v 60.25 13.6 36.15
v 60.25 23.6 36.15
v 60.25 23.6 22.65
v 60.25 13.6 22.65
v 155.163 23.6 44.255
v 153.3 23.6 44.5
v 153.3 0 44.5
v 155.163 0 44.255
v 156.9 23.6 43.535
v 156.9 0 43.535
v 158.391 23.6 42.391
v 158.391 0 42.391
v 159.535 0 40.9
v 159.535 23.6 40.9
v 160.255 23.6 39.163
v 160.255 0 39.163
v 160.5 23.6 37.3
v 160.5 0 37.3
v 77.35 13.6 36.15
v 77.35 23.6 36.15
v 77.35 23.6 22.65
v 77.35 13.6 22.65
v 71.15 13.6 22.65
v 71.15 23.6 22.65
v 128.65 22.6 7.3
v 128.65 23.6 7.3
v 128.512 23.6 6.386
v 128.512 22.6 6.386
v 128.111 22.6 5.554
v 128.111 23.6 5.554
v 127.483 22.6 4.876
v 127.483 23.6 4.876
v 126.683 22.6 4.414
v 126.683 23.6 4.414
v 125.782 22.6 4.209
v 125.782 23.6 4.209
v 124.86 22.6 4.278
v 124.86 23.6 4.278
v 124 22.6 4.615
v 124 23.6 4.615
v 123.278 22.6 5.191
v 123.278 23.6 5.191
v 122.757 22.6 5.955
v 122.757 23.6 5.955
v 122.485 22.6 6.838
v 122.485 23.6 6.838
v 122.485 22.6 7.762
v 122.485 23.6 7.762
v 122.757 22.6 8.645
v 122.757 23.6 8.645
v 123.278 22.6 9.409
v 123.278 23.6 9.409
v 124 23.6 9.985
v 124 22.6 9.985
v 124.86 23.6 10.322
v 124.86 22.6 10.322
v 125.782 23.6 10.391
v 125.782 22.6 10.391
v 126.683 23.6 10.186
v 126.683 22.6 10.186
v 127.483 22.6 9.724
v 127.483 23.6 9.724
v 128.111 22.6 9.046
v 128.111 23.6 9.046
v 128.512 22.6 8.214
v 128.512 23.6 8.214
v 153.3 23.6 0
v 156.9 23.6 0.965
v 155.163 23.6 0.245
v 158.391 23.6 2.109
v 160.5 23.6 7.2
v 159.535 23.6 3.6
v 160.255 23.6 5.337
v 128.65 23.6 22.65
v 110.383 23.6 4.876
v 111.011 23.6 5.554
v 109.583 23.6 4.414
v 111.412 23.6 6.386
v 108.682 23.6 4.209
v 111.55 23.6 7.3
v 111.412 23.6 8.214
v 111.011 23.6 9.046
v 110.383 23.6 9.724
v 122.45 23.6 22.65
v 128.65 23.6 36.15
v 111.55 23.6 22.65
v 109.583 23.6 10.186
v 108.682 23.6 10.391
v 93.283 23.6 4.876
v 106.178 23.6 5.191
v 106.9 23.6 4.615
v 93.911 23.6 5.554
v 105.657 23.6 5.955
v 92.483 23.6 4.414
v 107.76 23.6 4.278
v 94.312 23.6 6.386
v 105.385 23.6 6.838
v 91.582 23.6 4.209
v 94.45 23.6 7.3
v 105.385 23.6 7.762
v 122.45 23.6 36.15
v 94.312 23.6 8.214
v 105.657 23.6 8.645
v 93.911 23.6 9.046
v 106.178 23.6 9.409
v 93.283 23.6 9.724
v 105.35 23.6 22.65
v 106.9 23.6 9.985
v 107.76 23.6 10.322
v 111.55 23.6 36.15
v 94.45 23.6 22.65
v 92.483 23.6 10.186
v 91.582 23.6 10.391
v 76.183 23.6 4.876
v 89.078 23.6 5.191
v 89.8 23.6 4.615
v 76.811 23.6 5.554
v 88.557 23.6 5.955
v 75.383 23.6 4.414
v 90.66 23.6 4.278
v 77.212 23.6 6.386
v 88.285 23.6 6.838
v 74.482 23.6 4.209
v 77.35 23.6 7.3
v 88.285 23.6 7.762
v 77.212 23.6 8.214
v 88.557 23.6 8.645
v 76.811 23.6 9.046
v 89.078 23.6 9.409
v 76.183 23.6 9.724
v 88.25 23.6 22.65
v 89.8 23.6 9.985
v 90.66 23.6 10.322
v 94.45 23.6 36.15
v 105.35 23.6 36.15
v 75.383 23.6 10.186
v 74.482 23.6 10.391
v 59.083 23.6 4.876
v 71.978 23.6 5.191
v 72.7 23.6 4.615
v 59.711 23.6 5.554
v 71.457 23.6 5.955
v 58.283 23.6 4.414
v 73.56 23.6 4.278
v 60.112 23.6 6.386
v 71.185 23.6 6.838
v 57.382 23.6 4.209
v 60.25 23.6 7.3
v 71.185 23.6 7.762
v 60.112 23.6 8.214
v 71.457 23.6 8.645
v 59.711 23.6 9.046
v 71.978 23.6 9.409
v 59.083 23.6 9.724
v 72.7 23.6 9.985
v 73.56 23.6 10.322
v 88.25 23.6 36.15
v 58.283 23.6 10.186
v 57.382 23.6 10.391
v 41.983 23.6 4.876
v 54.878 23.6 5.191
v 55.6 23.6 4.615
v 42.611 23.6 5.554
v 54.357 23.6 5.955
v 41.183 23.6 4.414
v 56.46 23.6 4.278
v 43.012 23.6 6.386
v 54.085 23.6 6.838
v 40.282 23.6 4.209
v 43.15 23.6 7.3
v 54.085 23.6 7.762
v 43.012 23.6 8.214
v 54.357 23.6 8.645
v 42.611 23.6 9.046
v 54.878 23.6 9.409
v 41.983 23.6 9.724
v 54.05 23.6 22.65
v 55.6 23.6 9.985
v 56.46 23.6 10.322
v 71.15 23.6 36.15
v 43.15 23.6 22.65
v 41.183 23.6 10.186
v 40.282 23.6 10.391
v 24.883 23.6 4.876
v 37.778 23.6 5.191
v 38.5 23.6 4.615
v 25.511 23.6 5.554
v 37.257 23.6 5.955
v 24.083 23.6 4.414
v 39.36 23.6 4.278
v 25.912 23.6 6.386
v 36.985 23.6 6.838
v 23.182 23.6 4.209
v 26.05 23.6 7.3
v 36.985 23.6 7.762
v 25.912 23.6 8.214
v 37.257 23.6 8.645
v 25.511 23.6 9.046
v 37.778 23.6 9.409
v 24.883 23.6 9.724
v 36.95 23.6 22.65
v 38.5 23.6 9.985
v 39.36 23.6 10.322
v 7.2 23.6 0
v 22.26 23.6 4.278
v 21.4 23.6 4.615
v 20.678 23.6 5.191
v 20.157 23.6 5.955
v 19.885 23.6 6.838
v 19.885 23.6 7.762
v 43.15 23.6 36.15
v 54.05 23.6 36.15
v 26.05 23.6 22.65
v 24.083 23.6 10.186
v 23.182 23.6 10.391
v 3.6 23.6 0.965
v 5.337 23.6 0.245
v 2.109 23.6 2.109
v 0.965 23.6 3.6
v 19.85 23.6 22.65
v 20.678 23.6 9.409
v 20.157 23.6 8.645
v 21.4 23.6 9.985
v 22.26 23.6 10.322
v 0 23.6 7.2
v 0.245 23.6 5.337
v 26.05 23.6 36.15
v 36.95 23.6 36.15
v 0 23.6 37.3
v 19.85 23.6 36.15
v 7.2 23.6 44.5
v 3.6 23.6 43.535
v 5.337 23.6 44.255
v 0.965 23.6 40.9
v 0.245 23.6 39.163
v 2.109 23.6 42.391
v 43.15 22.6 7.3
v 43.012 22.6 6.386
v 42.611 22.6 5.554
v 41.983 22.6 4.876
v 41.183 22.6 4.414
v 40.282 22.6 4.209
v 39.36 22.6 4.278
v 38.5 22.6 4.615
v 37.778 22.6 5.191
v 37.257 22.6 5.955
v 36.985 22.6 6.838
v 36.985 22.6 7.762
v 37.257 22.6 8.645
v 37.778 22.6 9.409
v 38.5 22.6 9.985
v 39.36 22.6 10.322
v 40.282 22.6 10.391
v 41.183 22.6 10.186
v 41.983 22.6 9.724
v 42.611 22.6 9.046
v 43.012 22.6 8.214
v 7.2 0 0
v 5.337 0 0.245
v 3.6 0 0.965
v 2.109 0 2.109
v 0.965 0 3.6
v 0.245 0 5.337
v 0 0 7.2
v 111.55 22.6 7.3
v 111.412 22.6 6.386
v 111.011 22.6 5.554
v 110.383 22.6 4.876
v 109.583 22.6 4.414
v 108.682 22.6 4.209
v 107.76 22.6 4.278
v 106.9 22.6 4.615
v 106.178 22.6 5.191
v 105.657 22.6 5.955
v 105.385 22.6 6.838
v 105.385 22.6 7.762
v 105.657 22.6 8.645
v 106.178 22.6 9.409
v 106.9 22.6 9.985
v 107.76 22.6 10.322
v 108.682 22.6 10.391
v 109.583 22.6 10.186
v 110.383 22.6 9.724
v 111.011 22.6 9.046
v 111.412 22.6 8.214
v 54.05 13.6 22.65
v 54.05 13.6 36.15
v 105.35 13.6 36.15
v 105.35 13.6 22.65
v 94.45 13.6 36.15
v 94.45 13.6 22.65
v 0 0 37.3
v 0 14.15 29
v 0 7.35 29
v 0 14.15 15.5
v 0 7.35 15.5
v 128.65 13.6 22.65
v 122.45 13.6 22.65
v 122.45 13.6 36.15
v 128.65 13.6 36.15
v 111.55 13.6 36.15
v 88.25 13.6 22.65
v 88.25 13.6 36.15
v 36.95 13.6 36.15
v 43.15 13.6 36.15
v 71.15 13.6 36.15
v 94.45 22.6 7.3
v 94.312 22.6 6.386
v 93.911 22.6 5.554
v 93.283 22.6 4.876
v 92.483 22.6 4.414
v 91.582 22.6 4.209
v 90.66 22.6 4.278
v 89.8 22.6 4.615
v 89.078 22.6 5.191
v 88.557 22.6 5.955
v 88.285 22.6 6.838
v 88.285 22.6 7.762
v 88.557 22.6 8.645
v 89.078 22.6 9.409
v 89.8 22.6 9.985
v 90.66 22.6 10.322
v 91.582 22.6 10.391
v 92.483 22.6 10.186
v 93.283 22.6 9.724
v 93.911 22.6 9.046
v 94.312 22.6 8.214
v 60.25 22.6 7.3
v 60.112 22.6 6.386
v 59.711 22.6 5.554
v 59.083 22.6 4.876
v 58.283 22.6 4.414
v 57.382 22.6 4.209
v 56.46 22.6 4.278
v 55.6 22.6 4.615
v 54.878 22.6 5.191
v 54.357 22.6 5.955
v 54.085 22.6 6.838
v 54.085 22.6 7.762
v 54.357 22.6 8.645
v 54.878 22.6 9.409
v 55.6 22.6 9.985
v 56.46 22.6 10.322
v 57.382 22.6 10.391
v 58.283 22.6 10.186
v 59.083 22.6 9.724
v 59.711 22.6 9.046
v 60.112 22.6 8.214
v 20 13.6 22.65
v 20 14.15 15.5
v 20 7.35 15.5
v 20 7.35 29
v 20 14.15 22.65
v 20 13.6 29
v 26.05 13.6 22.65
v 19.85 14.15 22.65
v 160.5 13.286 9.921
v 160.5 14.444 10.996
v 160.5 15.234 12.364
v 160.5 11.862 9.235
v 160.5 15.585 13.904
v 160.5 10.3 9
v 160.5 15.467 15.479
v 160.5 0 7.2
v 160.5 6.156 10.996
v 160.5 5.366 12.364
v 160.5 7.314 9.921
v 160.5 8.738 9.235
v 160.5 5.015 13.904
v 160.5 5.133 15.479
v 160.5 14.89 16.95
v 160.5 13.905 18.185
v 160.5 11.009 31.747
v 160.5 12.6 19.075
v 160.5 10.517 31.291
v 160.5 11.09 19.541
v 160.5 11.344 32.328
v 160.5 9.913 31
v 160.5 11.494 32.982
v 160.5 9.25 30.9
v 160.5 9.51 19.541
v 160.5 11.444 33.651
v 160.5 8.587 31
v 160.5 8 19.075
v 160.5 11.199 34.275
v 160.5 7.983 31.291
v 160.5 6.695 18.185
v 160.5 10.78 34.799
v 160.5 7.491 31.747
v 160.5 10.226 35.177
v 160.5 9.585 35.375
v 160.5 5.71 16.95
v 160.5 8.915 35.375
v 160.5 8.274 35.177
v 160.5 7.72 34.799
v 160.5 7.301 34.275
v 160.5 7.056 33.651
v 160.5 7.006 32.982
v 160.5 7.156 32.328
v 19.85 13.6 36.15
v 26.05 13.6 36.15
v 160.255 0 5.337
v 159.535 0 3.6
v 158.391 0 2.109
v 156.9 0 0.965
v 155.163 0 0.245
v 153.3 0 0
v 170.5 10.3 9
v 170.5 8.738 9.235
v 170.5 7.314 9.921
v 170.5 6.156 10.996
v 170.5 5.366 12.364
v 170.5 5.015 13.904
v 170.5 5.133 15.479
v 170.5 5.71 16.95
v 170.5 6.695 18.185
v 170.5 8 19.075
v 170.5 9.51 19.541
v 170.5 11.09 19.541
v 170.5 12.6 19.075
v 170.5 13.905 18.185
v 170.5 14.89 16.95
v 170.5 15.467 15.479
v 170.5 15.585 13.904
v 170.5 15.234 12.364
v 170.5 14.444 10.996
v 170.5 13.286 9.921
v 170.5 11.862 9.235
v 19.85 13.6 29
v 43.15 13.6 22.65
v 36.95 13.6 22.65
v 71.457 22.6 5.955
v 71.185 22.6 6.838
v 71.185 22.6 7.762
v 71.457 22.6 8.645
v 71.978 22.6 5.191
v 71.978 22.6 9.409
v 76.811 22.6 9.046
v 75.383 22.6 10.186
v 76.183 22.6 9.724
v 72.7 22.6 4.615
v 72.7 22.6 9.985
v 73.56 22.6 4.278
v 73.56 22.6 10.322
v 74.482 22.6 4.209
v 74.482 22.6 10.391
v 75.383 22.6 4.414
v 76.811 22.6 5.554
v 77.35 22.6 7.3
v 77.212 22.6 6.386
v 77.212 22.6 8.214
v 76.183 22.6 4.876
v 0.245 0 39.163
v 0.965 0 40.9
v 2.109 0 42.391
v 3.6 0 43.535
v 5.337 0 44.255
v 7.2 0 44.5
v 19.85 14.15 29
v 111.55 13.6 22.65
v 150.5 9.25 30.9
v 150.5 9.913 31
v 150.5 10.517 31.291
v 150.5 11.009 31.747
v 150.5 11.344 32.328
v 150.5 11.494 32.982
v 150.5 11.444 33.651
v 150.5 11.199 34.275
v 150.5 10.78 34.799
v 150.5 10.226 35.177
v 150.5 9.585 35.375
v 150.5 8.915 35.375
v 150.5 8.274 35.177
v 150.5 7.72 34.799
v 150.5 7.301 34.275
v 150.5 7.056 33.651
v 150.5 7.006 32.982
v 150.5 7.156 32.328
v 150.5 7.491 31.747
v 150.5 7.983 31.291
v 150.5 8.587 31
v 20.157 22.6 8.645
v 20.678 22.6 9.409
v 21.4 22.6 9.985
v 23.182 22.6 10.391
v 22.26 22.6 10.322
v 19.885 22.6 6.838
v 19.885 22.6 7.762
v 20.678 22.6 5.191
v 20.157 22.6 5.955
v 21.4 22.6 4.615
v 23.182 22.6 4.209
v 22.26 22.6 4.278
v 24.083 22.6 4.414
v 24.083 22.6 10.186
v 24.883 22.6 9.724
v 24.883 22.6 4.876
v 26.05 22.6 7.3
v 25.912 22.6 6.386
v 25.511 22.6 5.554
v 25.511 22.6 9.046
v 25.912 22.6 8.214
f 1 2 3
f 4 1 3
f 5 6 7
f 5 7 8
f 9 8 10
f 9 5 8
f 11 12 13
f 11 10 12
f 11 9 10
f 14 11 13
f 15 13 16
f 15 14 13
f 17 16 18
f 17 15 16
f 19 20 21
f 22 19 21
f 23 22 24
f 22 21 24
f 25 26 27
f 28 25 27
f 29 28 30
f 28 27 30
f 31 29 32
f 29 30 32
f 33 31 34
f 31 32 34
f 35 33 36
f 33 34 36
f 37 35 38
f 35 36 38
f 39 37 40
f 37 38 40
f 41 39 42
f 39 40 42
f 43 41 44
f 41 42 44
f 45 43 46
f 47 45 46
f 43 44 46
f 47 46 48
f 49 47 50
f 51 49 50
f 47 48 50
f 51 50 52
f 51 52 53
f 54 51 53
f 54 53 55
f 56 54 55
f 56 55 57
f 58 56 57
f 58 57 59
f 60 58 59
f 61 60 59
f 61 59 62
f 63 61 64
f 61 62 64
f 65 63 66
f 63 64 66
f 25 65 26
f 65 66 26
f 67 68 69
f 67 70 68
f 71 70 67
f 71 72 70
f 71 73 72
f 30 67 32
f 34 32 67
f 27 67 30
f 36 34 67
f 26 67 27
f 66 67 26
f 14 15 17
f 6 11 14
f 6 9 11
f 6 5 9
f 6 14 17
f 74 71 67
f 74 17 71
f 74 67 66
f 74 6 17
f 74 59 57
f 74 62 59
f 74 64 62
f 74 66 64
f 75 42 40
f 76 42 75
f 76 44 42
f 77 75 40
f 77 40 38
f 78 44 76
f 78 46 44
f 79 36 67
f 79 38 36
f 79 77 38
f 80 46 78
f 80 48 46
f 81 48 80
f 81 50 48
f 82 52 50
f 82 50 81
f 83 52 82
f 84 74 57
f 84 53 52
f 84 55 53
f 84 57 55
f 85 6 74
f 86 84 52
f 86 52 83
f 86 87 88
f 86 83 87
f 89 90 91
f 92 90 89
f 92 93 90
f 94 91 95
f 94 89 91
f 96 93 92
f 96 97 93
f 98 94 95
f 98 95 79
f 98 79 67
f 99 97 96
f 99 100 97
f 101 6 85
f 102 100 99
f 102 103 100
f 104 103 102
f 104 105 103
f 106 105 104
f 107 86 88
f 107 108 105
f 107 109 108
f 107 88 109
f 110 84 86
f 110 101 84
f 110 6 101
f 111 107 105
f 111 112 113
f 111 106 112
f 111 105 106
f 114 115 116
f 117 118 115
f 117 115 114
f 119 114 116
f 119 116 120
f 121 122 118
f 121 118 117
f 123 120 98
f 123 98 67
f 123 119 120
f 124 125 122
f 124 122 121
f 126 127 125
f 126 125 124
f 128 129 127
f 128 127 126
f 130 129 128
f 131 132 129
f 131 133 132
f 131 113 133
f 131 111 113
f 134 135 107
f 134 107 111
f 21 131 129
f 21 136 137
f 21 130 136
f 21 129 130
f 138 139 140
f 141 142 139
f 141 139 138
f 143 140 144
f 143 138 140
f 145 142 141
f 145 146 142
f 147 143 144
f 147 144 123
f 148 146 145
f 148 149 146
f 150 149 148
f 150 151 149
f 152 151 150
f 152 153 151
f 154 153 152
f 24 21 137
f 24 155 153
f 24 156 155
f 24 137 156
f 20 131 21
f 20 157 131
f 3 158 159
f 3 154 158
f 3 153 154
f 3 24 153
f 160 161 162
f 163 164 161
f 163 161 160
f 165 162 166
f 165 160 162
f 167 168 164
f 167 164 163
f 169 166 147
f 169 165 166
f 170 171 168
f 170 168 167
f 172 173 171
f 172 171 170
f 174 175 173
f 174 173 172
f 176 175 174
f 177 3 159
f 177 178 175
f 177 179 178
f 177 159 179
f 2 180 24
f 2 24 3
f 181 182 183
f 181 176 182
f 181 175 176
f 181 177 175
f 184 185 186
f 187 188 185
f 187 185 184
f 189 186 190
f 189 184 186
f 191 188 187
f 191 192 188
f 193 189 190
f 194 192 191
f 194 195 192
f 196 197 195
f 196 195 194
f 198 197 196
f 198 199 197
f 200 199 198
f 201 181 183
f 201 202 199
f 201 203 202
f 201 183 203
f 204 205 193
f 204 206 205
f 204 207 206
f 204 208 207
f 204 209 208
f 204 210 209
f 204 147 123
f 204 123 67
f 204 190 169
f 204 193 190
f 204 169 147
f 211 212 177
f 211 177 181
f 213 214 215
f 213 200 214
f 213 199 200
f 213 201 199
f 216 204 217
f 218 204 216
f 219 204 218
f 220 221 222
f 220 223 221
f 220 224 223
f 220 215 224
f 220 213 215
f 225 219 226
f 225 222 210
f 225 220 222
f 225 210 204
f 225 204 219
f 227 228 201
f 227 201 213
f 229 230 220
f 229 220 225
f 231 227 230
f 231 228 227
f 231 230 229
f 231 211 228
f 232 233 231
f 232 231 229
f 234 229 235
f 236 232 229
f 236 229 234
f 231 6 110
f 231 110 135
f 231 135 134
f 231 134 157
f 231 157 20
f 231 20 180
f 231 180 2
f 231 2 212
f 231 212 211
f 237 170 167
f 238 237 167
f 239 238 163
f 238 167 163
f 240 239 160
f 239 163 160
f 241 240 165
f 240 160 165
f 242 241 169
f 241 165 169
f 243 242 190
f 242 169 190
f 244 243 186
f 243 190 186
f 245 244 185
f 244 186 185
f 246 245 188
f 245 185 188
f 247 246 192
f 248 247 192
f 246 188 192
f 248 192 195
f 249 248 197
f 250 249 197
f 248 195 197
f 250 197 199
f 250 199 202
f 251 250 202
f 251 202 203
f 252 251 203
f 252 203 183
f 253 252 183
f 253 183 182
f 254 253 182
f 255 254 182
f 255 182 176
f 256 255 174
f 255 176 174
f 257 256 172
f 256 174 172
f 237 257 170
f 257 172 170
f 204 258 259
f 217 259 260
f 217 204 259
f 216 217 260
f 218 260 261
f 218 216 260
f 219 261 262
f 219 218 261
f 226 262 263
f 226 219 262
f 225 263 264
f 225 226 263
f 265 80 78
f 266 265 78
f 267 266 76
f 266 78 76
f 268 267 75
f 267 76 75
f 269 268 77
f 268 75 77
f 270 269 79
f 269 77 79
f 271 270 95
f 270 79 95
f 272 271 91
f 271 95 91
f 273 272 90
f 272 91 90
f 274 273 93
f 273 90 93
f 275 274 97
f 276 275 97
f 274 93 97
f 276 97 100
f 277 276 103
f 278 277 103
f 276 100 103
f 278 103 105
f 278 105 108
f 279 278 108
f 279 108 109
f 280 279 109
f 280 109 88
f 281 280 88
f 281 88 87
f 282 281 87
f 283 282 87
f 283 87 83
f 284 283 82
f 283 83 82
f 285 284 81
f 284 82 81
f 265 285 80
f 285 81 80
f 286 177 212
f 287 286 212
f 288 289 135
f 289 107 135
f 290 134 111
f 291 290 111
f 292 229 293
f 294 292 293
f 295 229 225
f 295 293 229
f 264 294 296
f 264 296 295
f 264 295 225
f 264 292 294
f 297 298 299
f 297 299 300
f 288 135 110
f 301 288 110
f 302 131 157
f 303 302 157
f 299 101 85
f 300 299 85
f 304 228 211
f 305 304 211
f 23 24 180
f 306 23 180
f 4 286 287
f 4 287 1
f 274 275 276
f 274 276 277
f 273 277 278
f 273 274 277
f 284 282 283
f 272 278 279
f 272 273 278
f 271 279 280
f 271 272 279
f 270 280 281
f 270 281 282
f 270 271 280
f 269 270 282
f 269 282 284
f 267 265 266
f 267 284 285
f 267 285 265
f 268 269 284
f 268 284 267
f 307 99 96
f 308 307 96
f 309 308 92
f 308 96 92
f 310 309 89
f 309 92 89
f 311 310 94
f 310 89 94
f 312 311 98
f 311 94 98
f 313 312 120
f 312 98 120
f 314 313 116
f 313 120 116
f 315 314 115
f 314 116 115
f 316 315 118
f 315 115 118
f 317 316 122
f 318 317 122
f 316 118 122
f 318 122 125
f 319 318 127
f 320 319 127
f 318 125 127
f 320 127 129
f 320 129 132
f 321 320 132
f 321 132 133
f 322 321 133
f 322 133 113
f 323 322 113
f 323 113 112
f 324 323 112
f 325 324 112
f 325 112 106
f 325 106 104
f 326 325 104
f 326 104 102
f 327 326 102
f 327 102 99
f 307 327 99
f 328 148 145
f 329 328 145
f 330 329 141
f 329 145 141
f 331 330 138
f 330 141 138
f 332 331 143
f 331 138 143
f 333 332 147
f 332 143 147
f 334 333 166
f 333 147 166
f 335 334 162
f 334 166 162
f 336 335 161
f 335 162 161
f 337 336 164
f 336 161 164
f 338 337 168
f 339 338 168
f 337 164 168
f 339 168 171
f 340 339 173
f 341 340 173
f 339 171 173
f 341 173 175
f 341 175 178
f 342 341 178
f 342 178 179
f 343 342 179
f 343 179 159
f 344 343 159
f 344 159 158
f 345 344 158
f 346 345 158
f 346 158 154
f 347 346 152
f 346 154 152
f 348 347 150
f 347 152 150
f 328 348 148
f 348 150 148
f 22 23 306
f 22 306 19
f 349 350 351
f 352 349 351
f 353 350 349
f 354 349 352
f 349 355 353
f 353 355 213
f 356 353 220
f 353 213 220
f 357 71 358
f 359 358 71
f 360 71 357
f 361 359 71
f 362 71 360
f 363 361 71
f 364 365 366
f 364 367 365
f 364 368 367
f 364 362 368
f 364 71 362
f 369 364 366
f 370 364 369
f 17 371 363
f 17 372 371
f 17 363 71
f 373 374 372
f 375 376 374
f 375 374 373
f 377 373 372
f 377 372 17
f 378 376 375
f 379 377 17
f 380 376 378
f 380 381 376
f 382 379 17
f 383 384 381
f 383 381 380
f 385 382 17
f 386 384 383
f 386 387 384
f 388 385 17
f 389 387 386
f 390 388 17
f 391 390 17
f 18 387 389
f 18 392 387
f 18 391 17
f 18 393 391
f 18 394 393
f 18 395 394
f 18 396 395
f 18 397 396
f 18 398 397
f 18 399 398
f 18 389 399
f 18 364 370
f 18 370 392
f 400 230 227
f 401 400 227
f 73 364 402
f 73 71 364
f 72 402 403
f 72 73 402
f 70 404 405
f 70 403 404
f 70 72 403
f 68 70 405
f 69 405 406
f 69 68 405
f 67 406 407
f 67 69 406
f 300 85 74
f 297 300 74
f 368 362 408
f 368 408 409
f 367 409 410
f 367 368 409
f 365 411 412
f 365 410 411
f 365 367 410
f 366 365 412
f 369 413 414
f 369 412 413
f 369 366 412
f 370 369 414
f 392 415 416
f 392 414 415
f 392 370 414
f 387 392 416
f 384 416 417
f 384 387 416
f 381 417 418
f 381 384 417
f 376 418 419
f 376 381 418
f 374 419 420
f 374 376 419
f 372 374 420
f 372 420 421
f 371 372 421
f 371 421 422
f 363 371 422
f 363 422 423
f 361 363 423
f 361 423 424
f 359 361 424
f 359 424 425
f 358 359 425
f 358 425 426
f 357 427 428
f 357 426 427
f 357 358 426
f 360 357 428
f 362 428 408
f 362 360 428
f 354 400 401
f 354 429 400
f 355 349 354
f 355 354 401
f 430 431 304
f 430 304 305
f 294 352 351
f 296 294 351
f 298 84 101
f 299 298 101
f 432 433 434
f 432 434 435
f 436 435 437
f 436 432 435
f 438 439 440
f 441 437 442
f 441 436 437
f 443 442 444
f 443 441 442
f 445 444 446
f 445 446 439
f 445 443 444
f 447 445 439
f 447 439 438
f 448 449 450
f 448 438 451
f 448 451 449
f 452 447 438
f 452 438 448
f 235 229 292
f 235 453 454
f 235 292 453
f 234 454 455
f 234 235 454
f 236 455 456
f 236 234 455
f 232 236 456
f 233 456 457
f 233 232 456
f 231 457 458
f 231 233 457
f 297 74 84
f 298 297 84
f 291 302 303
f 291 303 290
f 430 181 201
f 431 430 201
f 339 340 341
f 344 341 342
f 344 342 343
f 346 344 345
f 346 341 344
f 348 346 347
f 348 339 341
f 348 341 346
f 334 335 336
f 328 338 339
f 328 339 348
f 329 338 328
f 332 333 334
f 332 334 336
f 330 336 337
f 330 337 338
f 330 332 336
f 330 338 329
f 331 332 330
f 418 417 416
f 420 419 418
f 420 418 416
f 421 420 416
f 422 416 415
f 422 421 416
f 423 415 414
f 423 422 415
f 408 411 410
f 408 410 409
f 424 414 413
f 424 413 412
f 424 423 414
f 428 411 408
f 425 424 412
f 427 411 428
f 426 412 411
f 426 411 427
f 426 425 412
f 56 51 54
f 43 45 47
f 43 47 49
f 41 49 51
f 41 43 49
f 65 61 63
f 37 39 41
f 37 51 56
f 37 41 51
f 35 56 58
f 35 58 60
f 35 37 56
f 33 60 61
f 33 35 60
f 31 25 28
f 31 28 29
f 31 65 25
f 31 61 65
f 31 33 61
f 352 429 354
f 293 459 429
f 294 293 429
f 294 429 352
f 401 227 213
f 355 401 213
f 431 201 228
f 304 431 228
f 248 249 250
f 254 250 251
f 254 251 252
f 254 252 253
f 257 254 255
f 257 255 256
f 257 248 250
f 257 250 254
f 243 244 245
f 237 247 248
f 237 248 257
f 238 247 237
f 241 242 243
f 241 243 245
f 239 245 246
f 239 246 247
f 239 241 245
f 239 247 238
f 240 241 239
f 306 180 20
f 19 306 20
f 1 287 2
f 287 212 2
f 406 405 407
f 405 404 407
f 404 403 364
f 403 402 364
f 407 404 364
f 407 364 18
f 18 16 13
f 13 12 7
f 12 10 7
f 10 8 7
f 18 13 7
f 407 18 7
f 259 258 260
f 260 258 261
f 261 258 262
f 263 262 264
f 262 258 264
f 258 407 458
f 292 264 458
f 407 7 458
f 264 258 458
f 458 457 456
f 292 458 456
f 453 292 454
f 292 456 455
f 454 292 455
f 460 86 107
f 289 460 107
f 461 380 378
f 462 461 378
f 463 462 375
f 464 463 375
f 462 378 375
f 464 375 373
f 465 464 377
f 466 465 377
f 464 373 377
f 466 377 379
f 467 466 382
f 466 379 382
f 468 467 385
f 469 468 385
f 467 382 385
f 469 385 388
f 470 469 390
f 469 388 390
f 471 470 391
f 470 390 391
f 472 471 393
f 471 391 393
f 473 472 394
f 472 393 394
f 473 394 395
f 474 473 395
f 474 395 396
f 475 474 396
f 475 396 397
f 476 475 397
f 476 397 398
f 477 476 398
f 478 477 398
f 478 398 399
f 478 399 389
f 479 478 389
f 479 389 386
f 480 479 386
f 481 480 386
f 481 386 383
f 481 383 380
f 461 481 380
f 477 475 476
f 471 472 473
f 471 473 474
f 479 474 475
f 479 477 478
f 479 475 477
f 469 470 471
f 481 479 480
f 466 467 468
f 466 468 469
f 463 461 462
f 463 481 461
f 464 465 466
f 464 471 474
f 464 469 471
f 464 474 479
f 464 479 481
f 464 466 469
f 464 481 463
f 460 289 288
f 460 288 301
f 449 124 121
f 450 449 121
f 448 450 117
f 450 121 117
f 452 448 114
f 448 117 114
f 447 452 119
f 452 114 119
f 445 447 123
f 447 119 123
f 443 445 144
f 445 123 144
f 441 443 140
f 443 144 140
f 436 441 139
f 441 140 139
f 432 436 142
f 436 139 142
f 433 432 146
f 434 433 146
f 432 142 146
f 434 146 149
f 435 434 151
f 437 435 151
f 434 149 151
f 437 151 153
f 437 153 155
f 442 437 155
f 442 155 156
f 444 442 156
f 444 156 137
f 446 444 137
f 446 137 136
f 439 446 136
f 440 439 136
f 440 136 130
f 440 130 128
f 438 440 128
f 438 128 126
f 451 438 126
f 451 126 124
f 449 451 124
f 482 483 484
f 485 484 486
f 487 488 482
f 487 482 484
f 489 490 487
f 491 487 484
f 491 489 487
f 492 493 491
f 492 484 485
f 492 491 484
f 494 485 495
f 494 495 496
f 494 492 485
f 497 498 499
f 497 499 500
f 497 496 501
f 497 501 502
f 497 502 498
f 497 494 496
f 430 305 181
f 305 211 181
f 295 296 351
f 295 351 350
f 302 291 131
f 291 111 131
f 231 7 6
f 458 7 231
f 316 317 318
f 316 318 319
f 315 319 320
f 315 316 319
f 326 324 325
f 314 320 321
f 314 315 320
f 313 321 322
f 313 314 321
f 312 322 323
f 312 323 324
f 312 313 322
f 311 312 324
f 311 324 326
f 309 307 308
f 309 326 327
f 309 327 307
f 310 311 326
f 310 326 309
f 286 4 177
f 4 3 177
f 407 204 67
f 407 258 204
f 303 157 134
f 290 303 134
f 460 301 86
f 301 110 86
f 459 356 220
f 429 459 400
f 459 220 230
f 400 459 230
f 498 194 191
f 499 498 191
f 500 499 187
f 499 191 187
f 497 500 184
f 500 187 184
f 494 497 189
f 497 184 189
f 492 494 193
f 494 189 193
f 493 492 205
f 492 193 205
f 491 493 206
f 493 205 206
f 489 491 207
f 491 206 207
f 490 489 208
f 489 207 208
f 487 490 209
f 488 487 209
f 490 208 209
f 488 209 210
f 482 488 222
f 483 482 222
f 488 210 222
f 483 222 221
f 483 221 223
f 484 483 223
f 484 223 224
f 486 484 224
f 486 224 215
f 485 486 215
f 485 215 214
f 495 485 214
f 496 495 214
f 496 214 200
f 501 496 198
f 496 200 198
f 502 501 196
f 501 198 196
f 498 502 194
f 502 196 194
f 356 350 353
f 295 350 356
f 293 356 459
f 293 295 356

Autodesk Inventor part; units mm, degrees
ref_plane "YZ Plane" through (0, 0, 0) normal (1, 0, 0) x (0, 1, 0)
ref_plane "XZ Plane" through (0, 0, 0) normal (0, 1, 0) x (-1, 0, 0)
ref_plane "XY Plane" through (0, 0, 0) normal (0, 0, 1) x (1, 0, 0)
sketch "Sketch1" plane through (0, 0, 0) normal (0, 1, 0) x (-1, 0, 0)
  line L0 (0, 0) -> (-160.5, 0)
  line L1 (-160.5, 0) -> (-160.5, 44.5)
  line L2 (-160.5, 44.5) -> (0, 44.5)
  line L3 (0, 44.5) -> (0, 0)
  dimension "d0" = 44.5
  dimension "d1" = 160.5
extrude "Extrusion1" add sketch "Sketch1" along normal blind 23.6
fillet "Fillet1" radius 7.2 4 edges at (0, 11.8, 44.5) (160.5, 11.8, 44.5) (160.5, 11.8, 0) (0, 11.8, 0)
sketch "Sketch2" plane through (160.5, 0, 37.3) normal (1, 0, 0) x (0, 0, -1)
  circle A0 centre (4.15, 9.25) radius 2.25
  line L0 (-7.2, 23.6) -> (-7.2, 0) projected
  line L1 (6.4, 23.6) -> (6.4, 0) construction
  line L2 (0, 23.6) -> (30.1, 23.6) construction
  line L3 (30.1, 0) -> (0, 0) construction
  line L4 (13.7348, 11.5) -> (-5.9943, 11.5) construction
  line L5 (0, 0) -> (-7.2, 0) construction
  point P0 (37.3, 0)
  dimension "d5" = 4.5
  dimension "d7" = 13.6
  dimension "d8" = 11.5
extrude "Extrusion2" cut sketch "Sketch2" against normal blind 10
sketch "Sketch3" plane through (160.5, 0, 37.3) normal (1, 0, 0) x (0, 0, -1)
  circle A0 centre (23, 10.3) radius 5.3
  line L0 (17.7, 15.6) -> (17.7, 1.2331) construction
  line L1 (17.7, 15.6) -> (23.008, 15.6) construction
  line L2 (30.1, 0) -> (0, 0) construction
  line L3 (37.3, 0) -> (37.3, 23.6) construction
  dimension "d11" = 10.6
  dimension "d12" = 15.6
  dimension "d13" = 19.6
extrude "Extrusion3" add sketch "Sketch3" along normal blind 10
sketch "Sketch4" plane through (0, 0, 7.2) normal (-1, 0, 0) x (0, 0, 1)
  line L0 (8.3, 14.15) -> (21.8, 14.15)
  line L1 (21.8, 14.15) -> (21.8, 7.35)
  line L2 (21.8, 7.35) -> (8.3, 7.35)
  line L3 (8.3, 7.35) -> (8.3, 14.15)
  line L4 (30.1, 0) -> (0, 0) projected
  line L5 (-7.2, 23.6) -> (-7.2, 0) projected
  line L6 (37.3, 0) -> (37.3, 23.6) projected
  dimension "d16" = 7.35
  dimension "d17" = 6.8
  dimension "d18" = 13.5
  dimension "d19" = 15.5
  dimension "d20" = 15.5
extrude "Extrusion4" cut sketch "Sketch4" against normal blind 20
sketch "Sketch5" plane through (0, 23.6, 0) normal (0, 1, 0) x (1, 0, 0)
  line L0 (0.85, -43.7) -> (159.65, -43.7) construction
  line L1 (159.65, -43.7) -> (159.65, -0.8) construction
  line L2 (159.65, -0.8) -> (0.85, -0.8) construction
  line L3 (0.85, -0.8) -> (0.85, -43.7) construction
  line L4 (153.3, 0) -> (7.2, 0) construction
  line L5 (7.2, -44.5) -> (153.3, -44.5) construction
  line L6 (0, -7.2) -> (0, -37.3) construction
  line L7 (160.5, -37.3) -> (160.5, -7.2) construction
  line L8 (19.85, -36.15) -> (26.05, -36.15)
  line L9 (26.05, -36.15) -> (26.05, -22.65)
  line L10 (26.05, -22.65) -> (19.85, -22.65)
  line L11 (19.85, -22.65) -> (19.85, -36.15)
  line L12 (43.15, -36.15) -> (43.15, -22.65)
  line L13 (43.15, -22.65) -> (36.95, -22.65)
  line L14 (36.95, -22.65) -> (36.95, -36.15)
  line L15 (36.95, -36.15) -> (43.15, -36.15)
  line L16 (60.25, -36.15) -> (60.25, -22.65)
  line L17 (60.25, -22.65) -> (54.05, -22.65)
  line L18 (54.05, -22.65) -> (54.05, -36.15)
  line L19 (54.05, -36.15) -> (60.25, -36.15)
  line L20 (77.35, -36.15) -> (77.35, -22.65)
  line L21 (77.35, -22.65) -> (71.15, -22.65)
  line L22 (71.15, -22.65) -> (71.15, -36.15)
  line L23 (71.15, -36.15) -> (77.35, -36.15)
  line L24 (94.45, -36.15) -> (94.45, -22.65)
  line L25 (94.45, -22.65) -> (88.25, -22.65)
  line L26 (88.25, -22.65) -> (88.25, -36.15)
  line L27 (88.25, -36.15) -> (94.45, -36.15)
  line L28 (111.55, -36.15) -> (111.55, -22.65)
  line L29 (111.55, -22.65) -> (105.35, -22.65)
  line L30 (105.35, -22.65) -> (105.35, -36.15)
  line L31 (105.35, -36.15) -> (111.55, -36.15)
  line L32 (128.65, -36.15) -> (128.65, -22.65)
  line L33 (128.65, -22.65) -> (122.45, -22.65)
  line L34 (122.45, -22.65) -> (122.45, -36.15)
  line L35 (122.45, -36.15) -> (128.65, -36.15)
  point P0 (0, 0)
  dimension "d23" = 42.9
  dimension "d24" = 158.8
  dimension "d25" = 0.8
  dimension "d27" = 0.8
  dimension "d28" = 0.85
  dimension "d29" = 0.85
  dimension "d30" = 7.55
  dimension "d31" = 13.5
  dimension "d32" = 6.2
  dimension "d33" = 19
  dimension "d36" = 17.1
extrude "Extrusion5" cut sketch "Sketch5" against normal blind 10
sketch "Sketch6" plane through (0, 23.6, 0) normal (0, 1, 0) x (1, 0, 0)
  circle A0 centre (22.95, -7.3) radius 3.1
  line L0 (19.85, -36.15) -> (19.85, -22.65) projected
  line L1 (26.05, -22.65) -> (26.05, -36.15) projected
  line L2 (153.3, 0) -> (7.2, 0) projected
  circle A1 centre (40.05, -7.3) radius 3.1
  circle A2 centre (57.15, -7.3) radius 3.1
  circle A3 centre (74.25, -7.3) radius 3.1
  circle A4 centre (91.35, -7.3) radius 3.1
  circle A5 centre (108.45, -7.3) radius 3.1
  circle A6 centre (125.55, -7.3) radius 3.1
  point P0 (0, 0)
  dimension "d43" = 4.2
  dimension "d46" = 17.1
extrude "Extrusion6" cut sketch "Sketch6" against normal blind 1
equation "\"d20\" = d19"
equation "\"d27\" = d25"
equation "\"d29\" = d28"
properties part number "hub_dummy"
